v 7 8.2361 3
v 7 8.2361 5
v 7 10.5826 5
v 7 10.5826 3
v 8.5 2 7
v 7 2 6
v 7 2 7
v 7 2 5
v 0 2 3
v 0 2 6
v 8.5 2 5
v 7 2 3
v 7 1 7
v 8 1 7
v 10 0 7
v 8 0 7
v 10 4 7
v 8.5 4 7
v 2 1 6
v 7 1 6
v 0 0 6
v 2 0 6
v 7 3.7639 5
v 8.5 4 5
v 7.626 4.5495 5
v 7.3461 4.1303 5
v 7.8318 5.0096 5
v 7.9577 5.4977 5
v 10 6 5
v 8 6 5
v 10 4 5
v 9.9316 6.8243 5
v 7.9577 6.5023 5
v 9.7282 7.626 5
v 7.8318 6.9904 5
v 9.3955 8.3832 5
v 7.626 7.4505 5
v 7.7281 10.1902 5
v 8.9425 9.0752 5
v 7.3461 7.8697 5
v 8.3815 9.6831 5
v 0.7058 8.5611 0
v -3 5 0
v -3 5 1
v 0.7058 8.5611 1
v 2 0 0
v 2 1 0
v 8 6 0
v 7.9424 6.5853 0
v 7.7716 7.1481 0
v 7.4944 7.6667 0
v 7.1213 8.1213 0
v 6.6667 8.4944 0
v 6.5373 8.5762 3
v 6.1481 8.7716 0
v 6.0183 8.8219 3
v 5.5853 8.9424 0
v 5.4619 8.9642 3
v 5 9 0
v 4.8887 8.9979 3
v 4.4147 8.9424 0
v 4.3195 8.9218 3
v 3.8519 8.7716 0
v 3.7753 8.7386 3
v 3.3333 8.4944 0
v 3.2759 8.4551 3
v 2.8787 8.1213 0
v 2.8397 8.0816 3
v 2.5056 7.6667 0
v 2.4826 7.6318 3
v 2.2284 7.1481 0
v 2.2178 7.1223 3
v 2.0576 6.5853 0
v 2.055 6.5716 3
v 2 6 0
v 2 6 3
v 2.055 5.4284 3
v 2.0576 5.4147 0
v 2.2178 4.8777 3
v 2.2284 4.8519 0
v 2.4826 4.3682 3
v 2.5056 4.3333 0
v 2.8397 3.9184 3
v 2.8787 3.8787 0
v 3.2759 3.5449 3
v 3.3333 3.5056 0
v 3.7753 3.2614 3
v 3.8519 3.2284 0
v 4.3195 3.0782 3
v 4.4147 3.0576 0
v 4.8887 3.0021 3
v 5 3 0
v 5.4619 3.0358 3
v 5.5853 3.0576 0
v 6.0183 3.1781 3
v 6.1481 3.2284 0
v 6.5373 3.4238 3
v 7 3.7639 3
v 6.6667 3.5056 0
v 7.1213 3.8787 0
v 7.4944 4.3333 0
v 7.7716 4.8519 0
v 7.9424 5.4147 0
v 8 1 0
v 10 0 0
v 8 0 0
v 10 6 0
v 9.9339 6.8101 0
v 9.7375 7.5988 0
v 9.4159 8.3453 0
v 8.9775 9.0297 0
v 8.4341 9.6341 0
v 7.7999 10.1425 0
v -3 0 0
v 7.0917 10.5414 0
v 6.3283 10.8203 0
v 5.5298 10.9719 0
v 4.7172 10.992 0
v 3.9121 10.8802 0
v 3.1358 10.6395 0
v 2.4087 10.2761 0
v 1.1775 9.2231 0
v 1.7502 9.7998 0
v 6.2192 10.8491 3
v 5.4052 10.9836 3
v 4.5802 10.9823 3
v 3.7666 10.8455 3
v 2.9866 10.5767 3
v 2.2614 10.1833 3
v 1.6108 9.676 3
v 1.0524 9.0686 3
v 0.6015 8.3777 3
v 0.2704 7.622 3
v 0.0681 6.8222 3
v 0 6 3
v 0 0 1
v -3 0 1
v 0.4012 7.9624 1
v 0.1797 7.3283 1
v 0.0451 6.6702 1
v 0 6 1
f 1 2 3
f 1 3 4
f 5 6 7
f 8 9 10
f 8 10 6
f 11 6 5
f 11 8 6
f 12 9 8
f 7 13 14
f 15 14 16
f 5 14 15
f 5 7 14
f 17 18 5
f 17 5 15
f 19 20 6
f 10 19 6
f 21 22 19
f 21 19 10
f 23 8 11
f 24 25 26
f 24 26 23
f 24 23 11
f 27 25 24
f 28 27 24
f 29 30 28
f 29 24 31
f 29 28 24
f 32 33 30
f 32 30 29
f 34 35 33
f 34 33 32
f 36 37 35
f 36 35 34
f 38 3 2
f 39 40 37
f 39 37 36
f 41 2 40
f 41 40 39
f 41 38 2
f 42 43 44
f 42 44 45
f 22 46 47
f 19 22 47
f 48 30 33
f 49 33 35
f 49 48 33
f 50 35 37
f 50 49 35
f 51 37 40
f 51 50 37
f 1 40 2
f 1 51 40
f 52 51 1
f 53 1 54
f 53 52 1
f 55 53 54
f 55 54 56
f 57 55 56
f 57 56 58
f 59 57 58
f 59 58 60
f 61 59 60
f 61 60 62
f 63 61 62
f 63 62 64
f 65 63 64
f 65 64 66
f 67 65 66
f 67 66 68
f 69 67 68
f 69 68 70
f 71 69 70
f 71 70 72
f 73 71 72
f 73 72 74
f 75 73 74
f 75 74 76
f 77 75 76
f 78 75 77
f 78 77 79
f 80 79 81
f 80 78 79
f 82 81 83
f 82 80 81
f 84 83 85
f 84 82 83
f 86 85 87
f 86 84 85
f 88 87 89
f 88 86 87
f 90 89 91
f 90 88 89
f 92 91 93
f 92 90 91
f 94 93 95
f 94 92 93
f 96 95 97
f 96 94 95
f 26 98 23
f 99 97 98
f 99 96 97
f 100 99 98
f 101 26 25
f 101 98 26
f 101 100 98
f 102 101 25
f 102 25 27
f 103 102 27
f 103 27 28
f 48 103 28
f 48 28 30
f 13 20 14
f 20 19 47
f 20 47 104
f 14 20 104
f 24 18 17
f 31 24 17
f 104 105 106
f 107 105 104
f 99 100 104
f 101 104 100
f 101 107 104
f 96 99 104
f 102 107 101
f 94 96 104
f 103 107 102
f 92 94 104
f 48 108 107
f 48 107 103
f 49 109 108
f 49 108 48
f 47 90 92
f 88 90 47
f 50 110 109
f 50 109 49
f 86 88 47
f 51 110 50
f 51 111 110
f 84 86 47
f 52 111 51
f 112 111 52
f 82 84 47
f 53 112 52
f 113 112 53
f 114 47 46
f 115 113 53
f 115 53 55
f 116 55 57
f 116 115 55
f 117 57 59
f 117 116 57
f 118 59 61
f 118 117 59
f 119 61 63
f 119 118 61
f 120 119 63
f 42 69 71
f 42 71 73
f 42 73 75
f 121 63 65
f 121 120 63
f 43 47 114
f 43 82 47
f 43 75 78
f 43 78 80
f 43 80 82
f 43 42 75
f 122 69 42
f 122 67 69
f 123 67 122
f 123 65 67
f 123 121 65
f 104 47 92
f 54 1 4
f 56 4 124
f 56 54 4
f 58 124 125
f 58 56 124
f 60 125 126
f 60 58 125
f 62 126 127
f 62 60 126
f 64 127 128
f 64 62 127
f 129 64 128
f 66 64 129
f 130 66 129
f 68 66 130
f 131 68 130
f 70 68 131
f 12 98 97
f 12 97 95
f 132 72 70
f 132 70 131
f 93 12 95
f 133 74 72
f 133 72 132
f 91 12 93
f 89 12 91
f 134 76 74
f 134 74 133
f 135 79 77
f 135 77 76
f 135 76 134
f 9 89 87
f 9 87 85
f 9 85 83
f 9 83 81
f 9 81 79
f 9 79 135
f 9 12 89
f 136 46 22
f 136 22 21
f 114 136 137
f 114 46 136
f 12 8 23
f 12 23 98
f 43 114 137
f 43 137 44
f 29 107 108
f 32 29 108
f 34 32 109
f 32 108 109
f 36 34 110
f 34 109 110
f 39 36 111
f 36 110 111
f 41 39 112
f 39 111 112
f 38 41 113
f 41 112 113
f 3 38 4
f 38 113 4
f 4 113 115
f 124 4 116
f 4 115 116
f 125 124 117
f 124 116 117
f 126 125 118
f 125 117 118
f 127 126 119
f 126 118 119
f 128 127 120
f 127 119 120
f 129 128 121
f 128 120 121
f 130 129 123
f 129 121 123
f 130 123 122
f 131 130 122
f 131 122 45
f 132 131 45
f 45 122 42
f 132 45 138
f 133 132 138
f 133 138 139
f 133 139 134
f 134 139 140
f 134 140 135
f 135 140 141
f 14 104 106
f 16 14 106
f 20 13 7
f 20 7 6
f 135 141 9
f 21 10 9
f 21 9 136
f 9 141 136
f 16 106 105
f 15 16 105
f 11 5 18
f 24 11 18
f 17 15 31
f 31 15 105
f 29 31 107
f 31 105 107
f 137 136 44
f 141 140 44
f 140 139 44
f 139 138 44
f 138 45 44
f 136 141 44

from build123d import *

# Parameters (mm, degrees)
SKETCH1_R           = 3
BOSS_EXTRUDE1_DEPTH = 7
BOSS_EXTRUDE2_DEPTH = 1
CUT_EXTRUDE1_DEPTH  = 2
CUT_EXTRUDE2_DEPTH  = 12
CUT_EXTRUDE3_DEPTH  = 12


with BuildPart() as part:
    # Sketch1 → Boss-Extrude1 (new body)
    with BuildSketch(Plane.XY):
        with BuildLine():
            Line((0, 0), (2, 0))
            Line((2, 0), (2, 1))
            Line((2, 1), (8, 1))
            Line((8, 1), (8, 0))
            Line((8, 0), (10, 0))
            Line((10, 0), (10, 6))
            ThreePointArc((10, 6), (5, 11), (0, 6))
            Line((0, 6), (0, 0))
        make_face()
        with Locations((5, 6)):
            Circle(SKETCH1_R, mode=Mode.SUBTRACT)
    extrude(amount=BOSS_EXTRUDE1_DEPTH)

    # Sketch2 → Boss-Extrude2 (add)
    with BuildSketch(Plane(origin=(0, 0, 0), x_dir=(-1, 0, 0), z_dir=(0, 0, -1))):
        Polygon((0, 0), (3, 0), (3, 5), (-0.705752773, 8.561140517), (-0.311985877, 0), align=None)
    extrude(amount=-BOSS_EXTRUDE2_DEPTH)

    # Sketch3 → Cut-Extrude1 (cut)
    with BuildSketch(Plane.XY.offset(7)):
        Polygon((7, 10.582575695), (7, 2), (8.5, 2), (8.5, 4), (10, 4), (10, 10.582575695), align=None)
    extrude(amount=-CUT_EXTRUDE1_DEPTH, mode=Mode.SUBTRACT)

    # Sketch4 → Cut-Extrude2 (cut)
    with BuildSketch(Plane(origin=(0, 0, 0), x_dir=(1, 0, 0), z_dir=(0, 1, 0))):
        Polygon((7, -7), (7, -6), (0, -6), (-0.727181491, -7.463826734), (7.362536443, -7.463826734), align=None)
    extrude(amount=CUT_EXTRUDE2_DEPTH, mode=Mode.SUBTRACT)

    # Sketch5 → Cut-Extrude3 (cut)
    with BuildSketch(Plane(origin=(0, 2, 0), x_dir=(1, 0, 0), z_dir=(0, 1, 0))):
        Polygon((7, -5), (7, -3), (0, -3), (0, -6), (7, -6), align=None)
    extrude(amount=CUT_EXTRUDE3_DEPTH, mode=Mode.SUBTRACT)


solid = part.part
